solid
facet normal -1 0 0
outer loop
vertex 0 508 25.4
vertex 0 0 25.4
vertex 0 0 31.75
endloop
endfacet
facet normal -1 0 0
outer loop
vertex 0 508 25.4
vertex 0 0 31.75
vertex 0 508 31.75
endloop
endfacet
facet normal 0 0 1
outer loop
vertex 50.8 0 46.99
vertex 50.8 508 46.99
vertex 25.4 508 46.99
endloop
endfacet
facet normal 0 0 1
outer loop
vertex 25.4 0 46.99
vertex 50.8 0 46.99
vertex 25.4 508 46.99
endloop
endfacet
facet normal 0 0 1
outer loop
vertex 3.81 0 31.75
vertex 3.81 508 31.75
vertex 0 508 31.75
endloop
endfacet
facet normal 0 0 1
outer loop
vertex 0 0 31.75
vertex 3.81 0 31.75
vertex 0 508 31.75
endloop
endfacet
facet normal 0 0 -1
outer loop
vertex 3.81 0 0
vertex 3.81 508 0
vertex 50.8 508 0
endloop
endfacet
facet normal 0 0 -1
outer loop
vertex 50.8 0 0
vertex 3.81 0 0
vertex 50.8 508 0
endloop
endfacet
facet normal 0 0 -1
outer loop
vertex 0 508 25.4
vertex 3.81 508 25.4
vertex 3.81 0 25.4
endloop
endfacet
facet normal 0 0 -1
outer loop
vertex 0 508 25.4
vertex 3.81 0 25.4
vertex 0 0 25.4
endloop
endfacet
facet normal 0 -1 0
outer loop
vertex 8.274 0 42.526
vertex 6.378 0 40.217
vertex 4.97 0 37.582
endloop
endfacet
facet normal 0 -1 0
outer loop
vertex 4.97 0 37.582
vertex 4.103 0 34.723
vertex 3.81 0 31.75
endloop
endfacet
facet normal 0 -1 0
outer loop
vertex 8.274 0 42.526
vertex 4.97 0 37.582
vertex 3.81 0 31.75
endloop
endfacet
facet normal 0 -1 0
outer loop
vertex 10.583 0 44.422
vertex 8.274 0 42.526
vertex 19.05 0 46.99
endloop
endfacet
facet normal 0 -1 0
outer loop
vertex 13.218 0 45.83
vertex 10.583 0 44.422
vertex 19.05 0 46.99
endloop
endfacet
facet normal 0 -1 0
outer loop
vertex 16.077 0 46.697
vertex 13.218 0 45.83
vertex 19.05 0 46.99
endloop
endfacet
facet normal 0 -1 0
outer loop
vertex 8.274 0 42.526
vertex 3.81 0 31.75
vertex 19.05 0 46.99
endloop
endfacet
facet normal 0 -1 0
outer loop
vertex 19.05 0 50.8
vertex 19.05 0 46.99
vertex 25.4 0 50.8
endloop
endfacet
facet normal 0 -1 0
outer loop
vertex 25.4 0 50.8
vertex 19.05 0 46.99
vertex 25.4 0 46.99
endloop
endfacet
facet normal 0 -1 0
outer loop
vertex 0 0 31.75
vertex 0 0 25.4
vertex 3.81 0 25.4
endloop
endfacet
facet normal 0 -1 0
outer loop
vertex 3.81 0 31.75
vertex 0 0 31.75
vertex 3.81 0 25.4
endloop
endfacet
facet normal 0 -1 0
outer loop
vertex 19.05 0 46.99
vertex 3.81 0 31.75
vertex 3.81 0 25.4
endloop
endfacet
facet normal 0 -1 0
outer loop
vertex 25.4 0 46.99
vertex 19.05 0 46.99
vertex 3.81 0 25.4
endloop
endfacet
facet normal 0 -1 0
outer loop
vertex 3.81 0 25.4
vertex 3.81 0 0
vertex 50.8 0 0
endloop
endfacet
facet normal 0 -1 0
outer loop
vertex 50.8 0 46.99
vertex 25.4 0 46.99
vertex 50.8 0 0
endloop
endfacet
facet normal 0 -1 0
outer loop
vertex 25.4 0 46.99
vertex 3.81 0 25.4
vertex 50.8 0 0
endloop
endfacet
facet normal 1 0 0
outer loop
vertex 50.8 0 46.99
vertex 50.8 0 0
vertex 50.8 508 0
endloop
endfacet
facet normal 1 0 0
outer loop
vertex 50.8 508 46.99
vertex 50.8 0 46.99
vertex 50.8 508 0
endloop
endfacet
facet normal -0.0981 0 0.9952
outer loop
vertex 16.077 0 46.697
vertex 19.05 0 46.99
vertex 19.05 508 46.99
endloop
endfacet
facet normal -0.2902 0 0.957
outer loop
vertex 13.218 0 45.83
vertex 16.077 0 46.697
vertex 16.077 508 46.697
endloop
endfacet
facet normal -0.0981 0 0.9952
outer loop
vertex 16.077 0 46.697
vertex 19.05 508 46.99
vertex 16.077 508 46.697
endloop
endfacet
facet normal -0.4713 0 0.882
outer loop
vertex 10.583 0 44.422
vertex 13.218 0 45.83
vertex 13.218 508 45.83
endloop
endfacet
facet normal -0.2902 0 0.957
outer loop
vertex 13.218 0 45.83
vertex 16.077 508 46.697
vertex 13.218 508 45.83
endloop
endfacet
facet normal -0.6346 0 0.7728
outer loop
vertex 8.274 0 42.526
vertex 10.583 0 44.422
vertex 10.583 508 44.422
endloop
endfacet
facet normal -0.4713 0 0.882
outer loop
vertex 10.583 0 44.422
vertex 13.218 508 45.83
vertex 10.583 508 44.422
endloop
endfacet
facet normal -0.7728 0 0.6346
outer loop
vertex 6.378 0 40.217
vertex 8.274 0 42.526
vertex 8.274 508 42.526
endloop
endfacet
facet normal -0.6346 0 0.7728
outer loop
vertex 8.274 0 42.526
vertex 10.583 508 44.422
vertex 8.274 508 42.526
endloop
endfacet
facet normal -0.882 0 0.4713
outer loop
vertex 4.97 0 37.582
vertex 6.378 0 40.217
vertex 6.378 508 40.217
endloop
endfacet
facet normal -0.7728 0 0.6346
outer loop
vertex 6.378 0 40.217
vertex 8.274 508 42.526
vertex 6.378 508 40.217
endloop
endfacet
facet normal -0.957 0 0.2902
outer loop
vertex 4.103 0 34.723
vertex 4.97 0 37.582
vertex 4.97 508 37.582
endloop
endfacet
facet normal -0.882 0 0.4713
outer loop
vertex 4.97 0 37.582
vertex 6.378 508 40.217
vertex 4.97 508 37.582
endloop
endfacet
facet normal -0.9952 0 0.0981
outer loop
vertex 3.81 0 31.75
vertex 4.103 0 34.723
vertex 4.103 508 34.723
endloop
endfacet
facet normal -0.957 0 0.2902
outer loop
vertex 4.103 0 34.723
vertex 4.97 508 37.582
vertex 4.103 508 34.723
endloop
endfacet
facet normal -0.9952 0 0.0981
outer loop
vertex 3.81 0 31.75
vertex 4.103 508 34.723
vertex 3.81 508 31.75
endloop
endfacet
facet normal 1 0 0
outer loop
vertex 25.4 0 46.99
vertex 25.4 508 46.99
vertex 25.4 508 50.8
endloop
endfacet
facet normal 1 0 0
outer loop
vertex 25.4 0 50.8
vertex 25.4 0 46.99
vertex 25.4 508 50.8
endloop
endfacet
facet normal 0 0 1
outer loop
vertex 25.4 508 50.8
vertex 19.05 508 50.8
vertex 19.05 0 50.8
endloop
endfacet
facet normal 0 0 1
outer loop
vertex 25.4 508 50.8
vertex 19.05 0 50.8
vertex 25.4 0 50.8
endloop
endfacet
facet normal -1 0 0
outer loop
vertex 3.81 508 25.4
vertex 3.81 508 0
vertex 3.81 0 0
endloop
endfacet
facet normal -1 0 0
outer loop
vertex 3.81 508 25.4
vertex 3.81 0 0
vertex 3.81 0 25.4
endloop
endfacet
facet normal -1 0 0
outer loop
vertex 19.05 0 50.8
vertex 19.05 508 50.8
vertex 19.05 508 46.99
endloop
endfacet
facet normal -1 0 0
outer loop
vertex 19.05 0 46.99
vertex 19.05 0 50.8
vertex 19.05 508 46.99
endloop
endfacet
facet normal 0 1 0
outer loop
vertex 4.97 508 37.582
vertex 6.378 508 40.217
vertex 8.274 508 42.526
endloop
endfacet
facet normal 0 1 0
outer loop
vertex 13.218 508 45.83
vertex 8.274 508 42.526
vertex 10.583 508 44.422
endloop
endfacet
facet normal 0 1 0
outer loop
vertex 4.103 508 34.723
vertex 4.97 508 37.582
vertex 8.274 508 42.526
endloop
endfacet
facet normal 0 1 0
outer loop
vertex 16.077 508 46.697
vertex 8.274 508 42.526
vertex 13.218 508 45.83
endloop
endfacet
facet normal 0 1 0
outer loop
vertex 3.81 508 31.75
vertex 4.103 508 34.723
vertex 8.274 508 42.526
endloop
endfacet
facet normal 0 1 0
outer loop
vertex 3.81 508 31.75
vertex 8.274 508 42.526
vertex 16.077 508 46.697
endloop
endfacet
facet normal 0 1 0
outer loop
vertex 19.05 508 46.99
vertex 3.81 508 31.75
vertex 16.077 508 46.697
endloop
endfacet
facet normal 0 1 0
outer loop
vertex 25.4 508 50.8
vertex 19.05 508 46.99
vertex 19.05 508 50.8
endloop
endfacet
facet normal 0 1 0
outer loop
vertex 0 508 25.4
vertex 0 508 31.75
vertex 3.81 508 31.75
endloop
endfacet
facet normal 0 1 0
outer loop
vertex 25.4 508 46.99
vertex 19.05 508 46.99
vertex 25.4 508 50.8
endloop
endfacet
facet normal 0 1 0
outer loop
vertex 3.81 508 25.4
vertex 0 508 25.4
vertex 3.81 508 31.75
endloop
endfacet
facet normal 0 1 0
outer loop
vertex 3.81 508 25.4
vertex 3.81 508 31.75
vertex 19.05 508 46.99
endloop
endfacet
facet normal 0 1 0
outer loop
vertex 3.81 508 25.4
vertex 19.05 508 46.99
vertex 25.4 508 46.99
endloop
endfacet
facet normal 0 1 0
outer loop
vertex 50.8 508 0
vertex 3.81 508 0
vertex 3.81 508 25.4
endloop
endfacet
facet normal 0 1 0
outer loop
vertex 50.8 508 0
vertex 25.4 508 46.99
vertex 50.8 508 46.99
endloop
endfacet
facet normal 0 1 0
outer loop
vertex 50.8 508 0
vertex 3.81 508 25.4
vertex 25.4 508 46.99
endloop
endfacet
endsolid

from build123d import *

# Parameters (mm, degrees)
F0_W     = 50.8
F0_H     = 508
F1_DEPTH = 50.8
F2_W     = 25.4
F2_H     = 3.81
F3_DEPTH = 508.001
F4_W     = 3.81
F4_H     = 25.4
F5_DEPTH = 508.001
F7_DEPTH = 508.001


with BuildPart() as f1:
    # F0 (on Top) → F1 (new body)
    with BuildSketch(Plane.XY):
        with Locations((25.4, 254)):
            Rectangle(F0_W, F0_H)
    extrude(amount=F1_DEPTH)

    # F2 (on face) → F3 (cut, through all)
    with BuildSketch(Plane(origin=(0, 508, 0), x_dir=(-1, 0, 0), z_dir=(0, 1, 0))):
        with Locations((-38.1, 48.895)):
            Rectangle(F2_W, F2_H)
    extrude(amount=-F3_DEPTH, mode=Mode.SUBTRACT)

    # F4 (on face) → F5 (cut, through all)
    with BuildSketch(Plane(origin=(0, 508, 0), x_dir=(-1, 0, 0), z_dir=(0, 1, 0))):
        with Locations((-1.905, 12.7)):
            Rectangle(F4_W, F4_H)
    extrude(amount=-F5_DEPTH, mode=Mode.SUBTRACT)

    # F6 (on face) → F7 (cut, through all)
    with BuildSketch(Plane(origin=(0, 508, 0), x_dir=(-1, 0, 0), z_dir=(0, 1, 0))):
        with BuildLine():
            Line((0, 50.8), (-19.05, 50.8))
            Line((-19.05, 50.8), (-19.05, 46.99))
            ThreePointArc((-19.05, 46.99), (-8.273693, 42.526307), (-3.81, 31.75))
            Line((-3.81, 31.75), (0, 31.75))
            Line((0, 31.75), (0, 50.8))
        make_face()
    extrude(amount=-F7_DEPTH, mode=Mode.SUBTRACT)


solid = f1.part
